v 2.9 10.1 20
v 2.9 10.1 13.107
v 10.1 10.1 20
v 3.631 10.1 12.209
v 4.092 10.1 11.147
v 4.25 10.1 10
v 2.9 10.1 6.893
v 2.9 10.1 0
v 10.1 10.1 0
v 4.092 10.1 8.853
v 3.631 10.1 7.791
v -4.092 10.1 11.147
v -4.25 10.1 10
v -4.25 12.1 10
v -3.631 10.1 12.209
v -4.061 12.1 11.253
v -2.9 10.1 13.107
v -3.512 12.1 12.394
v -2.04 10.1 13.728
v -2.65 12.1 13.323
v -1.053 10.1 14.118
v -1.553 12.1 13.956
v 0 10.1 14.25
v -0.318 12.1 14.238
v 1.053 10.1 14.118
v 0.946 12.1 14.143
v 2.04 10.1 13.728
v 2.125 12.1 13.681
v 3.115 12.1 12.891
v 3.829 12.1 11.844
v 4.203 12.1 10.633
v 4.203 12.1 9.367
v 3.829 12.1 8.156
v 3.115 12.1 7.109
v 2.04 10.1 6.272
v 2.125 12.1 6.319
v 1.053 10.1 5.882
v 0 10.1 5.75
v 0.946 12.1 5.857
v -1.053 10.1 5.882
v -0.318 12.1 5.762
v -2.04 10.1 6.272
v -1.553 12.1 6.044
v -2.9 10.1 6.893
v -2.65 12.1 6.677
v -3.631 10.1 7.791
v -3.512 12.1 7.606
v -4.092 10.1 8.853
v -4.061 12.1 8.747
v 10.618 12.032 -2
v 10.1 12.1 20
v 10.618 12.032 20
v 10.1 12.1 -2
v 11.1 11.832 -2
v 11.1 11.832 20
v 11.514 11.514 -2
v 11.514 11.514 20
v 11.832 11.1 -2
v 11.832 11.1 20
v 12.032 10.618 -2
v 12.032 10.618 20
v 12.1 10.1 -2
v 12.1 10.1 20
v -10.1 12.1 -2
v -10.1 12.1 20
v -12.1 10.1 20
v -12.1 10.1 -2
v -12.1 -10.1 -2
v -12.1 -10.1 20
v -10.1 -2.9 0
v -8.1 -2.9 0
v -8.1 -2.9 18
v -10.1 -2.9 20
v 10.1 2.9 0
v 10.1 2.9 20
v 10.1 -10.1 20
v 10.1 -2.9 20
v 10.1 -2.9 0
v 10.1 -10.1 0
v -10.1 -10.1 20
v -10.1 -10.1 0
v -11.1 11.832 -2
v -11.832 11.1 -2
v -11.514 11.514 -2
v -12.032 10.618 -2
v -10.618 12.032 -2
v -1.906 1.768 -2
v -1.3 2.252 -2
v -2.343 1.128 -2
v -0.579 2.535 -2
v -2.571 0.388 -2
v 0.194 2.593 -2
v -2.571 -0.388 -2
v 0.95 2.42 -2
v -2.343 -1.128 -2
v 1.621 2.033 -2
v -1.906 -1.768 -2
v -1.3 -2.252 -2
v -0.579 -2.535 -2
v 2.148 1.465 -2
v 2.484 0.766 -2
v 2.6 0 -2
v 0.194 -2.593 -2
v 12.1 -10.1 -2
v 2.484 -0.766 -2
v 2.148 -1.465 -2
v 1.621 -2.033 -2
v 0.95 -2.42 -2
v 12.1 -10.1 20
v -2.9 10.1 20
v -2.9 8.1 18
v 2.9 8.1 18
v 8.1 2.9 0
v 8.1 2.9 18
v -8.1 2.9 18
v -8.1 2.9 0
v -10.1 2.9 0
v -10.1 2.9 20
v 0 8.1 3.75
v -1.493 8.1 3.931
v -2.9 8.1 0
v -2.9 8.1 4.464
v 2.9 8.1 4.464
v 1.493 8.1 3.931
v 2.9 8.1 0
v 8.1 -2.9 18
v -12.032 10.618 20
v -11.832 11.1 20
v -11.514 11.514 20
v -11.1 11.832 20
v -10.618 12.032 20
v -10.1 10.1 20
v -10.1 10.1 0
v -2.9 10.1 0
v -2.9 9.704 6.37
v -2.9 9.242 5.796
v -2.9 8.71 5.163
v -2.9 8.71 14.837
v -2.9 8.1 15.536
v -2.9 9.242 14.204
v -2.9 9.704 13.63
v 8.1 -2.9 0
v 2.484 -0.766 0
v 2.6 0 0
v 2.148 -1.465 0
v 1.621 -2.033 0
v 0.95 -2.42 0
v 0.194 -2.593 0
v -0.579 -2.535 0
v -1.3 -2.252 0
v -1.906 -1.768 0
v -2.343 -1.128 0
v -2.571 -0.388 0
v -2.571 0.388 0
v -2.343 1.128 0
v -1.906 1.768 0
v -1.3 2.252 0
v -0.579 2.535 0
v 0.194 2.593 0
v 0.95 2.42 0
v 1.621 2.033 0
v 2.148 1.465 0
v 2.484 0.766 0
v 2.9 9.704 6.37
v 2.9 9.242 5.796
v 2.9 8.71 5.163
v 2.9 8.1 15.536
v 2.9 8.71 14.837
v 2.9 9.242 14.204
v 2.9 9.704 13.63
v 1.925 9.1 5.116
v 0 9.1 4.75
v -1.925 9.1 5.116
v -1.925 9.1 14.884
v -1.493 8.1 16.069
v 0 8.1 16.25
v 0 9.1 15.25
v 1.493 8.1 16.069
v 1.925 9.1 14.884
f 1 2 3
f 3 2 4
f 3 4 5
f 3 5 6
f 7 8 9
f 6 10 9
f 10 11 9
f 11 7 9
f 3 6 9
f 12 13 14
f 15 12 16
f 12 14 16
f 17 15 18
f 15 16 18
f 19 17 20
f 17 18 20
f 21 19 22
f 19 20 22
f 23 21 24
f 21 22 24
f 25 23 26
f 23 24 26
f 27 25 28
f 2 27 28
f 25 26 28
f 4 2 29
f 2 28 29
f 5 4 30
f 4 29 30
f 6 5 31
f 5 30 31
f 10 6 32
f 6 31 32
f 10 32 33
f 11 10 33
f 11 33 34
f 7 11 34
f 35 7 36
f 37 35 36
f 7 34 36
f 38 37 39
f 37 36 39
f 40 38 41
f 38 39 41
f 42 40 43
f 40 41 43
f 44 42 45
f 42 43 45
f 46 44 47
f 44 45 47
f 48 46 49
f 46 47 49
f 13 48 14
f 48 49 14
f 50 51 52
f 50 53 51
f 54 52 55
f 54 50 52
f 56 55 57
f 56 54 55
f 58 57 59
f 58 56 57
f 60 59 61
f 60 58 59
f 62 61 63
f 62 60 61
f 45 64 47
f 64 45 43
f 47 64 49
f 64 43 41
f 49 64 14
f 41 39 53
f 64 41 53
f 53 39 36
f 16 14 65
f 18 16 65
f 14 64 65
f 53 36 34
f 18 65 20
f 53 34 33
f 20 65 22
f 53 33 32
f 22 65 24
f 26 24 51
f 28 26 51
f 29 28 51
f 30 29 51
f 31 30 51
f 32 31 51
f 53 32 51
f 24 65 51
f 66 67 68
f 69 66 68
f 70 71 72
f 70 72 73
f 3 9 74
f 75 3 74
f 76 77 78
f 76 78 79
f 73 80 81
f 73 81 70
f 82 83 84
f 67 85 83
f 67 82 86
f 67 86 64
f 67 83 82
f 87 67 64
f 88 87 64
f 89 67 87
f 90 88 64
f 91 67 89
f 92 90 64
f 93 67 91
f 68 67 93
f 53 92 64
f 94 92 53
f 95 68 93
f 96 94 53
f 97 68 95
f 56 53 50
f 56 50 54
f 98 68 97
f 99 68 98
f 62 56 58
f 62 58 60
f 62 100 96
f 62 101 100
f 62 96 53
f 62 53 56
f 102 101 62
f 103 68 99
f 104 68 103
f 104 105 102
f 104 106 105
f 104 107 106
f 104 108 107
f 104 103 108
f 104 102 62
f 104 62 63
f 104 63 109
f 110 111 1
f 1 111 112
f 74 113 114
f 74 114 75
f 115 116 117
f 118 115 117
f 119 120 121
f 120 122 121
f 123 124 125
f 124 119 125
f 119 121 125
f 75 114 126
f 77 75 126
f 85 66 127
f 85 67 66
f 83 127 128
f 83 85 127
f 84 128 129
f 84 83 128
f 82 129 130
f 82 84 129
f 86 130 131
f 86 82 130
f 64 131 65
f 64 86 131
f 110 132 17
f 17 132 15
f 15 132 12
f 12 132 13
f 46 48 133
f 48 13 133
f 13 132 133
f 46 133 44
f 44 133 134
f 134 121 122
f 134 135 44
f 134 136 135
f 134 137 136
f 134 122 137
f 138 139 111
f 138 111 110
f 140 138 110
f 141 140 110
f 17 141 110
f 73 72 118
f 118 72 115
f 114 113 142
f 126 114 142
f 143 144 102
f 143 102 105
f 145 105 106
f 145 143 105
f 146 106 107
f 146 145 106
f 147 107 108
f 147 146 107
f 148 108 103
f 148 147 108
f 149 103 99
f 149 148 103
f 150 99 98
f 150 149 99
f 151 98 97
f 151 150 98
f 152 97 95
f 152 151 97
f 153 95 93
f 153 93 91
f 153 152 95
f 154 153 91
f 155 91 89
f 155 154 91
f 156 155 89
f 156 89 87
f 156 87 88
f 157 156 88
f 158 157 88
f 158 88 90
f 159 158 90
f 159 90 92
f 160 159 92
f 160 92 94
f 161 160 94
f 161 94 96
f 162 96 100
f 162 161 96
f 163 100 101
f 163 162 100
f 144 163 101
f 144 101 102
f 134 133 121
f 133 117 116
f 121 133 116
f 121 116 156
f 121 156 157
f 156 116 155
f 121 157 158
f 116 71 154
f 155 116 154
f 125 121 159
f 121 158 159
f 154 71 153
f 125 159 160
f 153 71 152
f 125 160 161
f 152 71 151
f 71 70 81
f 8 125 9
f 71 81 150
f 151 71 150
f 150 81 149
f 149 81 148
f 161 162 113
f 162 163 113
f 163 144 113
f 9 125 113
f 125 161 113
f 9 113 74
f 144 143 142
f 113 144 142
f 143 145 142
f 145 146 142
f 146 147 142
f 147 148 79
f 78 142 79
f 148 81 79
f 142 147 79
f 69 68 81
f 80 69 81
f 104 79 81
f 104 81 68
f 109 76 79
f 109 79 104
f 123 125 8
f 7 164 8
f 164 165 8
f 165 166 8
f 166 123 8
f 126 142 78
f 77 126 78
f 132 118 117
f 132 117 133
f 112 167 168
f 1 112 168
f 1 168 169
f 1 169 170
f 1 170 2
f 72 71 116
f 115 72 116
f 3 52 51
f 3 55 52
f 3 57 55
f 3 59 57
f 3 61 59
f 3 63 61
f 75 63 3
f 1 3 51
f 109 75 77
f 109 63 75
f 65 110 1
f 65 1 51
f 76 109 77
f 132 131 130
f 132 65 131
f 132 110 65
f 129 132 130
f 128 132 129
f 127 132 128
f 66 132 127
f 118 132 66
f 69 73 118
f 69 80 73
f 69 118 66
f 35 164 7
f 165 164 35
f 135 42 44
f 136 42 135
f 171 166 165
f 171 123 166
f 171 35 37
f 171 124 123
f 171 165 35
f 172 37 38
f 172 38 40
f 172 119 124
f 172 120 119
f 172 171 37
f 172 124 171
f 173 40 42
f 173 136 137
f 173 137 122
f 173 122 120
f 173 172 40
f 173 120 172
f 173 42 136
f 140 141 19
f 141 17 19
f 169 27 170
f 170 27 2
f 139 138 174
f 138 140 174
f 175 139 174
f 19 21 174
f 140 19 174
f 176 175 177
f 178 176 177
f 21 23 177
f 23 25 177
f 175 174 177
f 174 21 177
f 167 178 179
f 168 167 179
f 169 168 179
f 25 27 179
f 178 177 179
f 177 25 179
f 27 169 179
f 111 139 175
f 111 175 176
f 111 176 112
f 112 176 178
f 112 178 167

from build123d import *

# Parameters (mm, degrees)
F1_W      = 5.8
F1_H      = 2
F2_DEPTH  = 20
F4_COUNT  = 4
F5_R      = 4.25
F6_DEPTH  = 24.201
F8_DEPTH  = 20.001
F9_W      = 24.2
F9_H      = 22.2
F9_R      = 2.6
F10_DEPTH = 2
F11_R     = 2
F12_SIZE  = 2


with BuildPart() as f2:
    # F1 (on Top) → F2 (new body)
    with BuildSketch(Plane.XY):
        Polygon((-12.1, 12.1), (-12.1, 10.1), (-2.9, 10.1), (2.9, 10.1), (12.1, 10.1), (12.1, 12.1), align=None)
        with Locations((0, 9.1)):
            Rectangle(F1_W, F1_H)
    extrude(amount=F2_DEPTH)

    # F4: F2 ×4 about axis
    f4_axis = Axis((0, 0, 13.2065918297), (0, 0, 1))


with BuildPart() as f2_1:
    add(f2.part)
    for i in range(1, F4_COUNT):
        add(f2.part.rotate(f4_axis, i * 360 / F4_COUNT))

    # F5 (on face) → F6 (cut, through all)
    with BuildSketch(Plane(origin=(0, 12.1, 0), x_dir=(-1, 0, 0), z_dir=(0, 1, 0))):
        with Locations((0, 10)):
            Circle(F5_R)
    extrude(amount=-F6_DEPTH, mode=Mode.SUBTRACT)

    # F7 (on face) → F8 (cut, through all)
    with BuildSketch(Plane.XY.offset(20)):
        Polygon((-2.9, -8.1), (-10.1, -10.1), (-12.1, -10.1), (-12.1, -12.1), (12.1, -12.1), (12.1, -10.1), (10.1, -10.1), (2.9, -8.1), align=None)
    extrude(amount=-F8_DEPTH, mode=Mode.SUBTRACT)

    # F9 (on face) → F10 (join)
    with BuildSketch(Plane(origin=(0, 0, 0), x_dir=(1, 0, 0), z_dir=(0, 0, -1))):
        with Locations((0, -1)):
            Rectangle(F9_W, F9_H)
        Circle(F9_R, mode=Mode.SUBTRACT)
    extrude(amount=F10_DEPTH)

    # F11
    f11_edges = [f2_1.edges().sort_by_distance(p)[0] for p in [
        (-12.1, 12.1, 9),
        (12.1, 12.1, 9),
    ]]
    fillet(f11_edges, radius=F11_R)

    # F12
    f12_edges = [f2_1.edges().sort_by_distance(p)[0] for p in [
        (0, 8.1, 5.75),
        (0, 8.1, 14.25),
        (-8.1, 0, 20),
        (0, 8.1, 20),
        (8.1, 0, 20),
    ]]
    chamfer(f12_edges, length=F12_SIZE)


solid = f2_1.part
